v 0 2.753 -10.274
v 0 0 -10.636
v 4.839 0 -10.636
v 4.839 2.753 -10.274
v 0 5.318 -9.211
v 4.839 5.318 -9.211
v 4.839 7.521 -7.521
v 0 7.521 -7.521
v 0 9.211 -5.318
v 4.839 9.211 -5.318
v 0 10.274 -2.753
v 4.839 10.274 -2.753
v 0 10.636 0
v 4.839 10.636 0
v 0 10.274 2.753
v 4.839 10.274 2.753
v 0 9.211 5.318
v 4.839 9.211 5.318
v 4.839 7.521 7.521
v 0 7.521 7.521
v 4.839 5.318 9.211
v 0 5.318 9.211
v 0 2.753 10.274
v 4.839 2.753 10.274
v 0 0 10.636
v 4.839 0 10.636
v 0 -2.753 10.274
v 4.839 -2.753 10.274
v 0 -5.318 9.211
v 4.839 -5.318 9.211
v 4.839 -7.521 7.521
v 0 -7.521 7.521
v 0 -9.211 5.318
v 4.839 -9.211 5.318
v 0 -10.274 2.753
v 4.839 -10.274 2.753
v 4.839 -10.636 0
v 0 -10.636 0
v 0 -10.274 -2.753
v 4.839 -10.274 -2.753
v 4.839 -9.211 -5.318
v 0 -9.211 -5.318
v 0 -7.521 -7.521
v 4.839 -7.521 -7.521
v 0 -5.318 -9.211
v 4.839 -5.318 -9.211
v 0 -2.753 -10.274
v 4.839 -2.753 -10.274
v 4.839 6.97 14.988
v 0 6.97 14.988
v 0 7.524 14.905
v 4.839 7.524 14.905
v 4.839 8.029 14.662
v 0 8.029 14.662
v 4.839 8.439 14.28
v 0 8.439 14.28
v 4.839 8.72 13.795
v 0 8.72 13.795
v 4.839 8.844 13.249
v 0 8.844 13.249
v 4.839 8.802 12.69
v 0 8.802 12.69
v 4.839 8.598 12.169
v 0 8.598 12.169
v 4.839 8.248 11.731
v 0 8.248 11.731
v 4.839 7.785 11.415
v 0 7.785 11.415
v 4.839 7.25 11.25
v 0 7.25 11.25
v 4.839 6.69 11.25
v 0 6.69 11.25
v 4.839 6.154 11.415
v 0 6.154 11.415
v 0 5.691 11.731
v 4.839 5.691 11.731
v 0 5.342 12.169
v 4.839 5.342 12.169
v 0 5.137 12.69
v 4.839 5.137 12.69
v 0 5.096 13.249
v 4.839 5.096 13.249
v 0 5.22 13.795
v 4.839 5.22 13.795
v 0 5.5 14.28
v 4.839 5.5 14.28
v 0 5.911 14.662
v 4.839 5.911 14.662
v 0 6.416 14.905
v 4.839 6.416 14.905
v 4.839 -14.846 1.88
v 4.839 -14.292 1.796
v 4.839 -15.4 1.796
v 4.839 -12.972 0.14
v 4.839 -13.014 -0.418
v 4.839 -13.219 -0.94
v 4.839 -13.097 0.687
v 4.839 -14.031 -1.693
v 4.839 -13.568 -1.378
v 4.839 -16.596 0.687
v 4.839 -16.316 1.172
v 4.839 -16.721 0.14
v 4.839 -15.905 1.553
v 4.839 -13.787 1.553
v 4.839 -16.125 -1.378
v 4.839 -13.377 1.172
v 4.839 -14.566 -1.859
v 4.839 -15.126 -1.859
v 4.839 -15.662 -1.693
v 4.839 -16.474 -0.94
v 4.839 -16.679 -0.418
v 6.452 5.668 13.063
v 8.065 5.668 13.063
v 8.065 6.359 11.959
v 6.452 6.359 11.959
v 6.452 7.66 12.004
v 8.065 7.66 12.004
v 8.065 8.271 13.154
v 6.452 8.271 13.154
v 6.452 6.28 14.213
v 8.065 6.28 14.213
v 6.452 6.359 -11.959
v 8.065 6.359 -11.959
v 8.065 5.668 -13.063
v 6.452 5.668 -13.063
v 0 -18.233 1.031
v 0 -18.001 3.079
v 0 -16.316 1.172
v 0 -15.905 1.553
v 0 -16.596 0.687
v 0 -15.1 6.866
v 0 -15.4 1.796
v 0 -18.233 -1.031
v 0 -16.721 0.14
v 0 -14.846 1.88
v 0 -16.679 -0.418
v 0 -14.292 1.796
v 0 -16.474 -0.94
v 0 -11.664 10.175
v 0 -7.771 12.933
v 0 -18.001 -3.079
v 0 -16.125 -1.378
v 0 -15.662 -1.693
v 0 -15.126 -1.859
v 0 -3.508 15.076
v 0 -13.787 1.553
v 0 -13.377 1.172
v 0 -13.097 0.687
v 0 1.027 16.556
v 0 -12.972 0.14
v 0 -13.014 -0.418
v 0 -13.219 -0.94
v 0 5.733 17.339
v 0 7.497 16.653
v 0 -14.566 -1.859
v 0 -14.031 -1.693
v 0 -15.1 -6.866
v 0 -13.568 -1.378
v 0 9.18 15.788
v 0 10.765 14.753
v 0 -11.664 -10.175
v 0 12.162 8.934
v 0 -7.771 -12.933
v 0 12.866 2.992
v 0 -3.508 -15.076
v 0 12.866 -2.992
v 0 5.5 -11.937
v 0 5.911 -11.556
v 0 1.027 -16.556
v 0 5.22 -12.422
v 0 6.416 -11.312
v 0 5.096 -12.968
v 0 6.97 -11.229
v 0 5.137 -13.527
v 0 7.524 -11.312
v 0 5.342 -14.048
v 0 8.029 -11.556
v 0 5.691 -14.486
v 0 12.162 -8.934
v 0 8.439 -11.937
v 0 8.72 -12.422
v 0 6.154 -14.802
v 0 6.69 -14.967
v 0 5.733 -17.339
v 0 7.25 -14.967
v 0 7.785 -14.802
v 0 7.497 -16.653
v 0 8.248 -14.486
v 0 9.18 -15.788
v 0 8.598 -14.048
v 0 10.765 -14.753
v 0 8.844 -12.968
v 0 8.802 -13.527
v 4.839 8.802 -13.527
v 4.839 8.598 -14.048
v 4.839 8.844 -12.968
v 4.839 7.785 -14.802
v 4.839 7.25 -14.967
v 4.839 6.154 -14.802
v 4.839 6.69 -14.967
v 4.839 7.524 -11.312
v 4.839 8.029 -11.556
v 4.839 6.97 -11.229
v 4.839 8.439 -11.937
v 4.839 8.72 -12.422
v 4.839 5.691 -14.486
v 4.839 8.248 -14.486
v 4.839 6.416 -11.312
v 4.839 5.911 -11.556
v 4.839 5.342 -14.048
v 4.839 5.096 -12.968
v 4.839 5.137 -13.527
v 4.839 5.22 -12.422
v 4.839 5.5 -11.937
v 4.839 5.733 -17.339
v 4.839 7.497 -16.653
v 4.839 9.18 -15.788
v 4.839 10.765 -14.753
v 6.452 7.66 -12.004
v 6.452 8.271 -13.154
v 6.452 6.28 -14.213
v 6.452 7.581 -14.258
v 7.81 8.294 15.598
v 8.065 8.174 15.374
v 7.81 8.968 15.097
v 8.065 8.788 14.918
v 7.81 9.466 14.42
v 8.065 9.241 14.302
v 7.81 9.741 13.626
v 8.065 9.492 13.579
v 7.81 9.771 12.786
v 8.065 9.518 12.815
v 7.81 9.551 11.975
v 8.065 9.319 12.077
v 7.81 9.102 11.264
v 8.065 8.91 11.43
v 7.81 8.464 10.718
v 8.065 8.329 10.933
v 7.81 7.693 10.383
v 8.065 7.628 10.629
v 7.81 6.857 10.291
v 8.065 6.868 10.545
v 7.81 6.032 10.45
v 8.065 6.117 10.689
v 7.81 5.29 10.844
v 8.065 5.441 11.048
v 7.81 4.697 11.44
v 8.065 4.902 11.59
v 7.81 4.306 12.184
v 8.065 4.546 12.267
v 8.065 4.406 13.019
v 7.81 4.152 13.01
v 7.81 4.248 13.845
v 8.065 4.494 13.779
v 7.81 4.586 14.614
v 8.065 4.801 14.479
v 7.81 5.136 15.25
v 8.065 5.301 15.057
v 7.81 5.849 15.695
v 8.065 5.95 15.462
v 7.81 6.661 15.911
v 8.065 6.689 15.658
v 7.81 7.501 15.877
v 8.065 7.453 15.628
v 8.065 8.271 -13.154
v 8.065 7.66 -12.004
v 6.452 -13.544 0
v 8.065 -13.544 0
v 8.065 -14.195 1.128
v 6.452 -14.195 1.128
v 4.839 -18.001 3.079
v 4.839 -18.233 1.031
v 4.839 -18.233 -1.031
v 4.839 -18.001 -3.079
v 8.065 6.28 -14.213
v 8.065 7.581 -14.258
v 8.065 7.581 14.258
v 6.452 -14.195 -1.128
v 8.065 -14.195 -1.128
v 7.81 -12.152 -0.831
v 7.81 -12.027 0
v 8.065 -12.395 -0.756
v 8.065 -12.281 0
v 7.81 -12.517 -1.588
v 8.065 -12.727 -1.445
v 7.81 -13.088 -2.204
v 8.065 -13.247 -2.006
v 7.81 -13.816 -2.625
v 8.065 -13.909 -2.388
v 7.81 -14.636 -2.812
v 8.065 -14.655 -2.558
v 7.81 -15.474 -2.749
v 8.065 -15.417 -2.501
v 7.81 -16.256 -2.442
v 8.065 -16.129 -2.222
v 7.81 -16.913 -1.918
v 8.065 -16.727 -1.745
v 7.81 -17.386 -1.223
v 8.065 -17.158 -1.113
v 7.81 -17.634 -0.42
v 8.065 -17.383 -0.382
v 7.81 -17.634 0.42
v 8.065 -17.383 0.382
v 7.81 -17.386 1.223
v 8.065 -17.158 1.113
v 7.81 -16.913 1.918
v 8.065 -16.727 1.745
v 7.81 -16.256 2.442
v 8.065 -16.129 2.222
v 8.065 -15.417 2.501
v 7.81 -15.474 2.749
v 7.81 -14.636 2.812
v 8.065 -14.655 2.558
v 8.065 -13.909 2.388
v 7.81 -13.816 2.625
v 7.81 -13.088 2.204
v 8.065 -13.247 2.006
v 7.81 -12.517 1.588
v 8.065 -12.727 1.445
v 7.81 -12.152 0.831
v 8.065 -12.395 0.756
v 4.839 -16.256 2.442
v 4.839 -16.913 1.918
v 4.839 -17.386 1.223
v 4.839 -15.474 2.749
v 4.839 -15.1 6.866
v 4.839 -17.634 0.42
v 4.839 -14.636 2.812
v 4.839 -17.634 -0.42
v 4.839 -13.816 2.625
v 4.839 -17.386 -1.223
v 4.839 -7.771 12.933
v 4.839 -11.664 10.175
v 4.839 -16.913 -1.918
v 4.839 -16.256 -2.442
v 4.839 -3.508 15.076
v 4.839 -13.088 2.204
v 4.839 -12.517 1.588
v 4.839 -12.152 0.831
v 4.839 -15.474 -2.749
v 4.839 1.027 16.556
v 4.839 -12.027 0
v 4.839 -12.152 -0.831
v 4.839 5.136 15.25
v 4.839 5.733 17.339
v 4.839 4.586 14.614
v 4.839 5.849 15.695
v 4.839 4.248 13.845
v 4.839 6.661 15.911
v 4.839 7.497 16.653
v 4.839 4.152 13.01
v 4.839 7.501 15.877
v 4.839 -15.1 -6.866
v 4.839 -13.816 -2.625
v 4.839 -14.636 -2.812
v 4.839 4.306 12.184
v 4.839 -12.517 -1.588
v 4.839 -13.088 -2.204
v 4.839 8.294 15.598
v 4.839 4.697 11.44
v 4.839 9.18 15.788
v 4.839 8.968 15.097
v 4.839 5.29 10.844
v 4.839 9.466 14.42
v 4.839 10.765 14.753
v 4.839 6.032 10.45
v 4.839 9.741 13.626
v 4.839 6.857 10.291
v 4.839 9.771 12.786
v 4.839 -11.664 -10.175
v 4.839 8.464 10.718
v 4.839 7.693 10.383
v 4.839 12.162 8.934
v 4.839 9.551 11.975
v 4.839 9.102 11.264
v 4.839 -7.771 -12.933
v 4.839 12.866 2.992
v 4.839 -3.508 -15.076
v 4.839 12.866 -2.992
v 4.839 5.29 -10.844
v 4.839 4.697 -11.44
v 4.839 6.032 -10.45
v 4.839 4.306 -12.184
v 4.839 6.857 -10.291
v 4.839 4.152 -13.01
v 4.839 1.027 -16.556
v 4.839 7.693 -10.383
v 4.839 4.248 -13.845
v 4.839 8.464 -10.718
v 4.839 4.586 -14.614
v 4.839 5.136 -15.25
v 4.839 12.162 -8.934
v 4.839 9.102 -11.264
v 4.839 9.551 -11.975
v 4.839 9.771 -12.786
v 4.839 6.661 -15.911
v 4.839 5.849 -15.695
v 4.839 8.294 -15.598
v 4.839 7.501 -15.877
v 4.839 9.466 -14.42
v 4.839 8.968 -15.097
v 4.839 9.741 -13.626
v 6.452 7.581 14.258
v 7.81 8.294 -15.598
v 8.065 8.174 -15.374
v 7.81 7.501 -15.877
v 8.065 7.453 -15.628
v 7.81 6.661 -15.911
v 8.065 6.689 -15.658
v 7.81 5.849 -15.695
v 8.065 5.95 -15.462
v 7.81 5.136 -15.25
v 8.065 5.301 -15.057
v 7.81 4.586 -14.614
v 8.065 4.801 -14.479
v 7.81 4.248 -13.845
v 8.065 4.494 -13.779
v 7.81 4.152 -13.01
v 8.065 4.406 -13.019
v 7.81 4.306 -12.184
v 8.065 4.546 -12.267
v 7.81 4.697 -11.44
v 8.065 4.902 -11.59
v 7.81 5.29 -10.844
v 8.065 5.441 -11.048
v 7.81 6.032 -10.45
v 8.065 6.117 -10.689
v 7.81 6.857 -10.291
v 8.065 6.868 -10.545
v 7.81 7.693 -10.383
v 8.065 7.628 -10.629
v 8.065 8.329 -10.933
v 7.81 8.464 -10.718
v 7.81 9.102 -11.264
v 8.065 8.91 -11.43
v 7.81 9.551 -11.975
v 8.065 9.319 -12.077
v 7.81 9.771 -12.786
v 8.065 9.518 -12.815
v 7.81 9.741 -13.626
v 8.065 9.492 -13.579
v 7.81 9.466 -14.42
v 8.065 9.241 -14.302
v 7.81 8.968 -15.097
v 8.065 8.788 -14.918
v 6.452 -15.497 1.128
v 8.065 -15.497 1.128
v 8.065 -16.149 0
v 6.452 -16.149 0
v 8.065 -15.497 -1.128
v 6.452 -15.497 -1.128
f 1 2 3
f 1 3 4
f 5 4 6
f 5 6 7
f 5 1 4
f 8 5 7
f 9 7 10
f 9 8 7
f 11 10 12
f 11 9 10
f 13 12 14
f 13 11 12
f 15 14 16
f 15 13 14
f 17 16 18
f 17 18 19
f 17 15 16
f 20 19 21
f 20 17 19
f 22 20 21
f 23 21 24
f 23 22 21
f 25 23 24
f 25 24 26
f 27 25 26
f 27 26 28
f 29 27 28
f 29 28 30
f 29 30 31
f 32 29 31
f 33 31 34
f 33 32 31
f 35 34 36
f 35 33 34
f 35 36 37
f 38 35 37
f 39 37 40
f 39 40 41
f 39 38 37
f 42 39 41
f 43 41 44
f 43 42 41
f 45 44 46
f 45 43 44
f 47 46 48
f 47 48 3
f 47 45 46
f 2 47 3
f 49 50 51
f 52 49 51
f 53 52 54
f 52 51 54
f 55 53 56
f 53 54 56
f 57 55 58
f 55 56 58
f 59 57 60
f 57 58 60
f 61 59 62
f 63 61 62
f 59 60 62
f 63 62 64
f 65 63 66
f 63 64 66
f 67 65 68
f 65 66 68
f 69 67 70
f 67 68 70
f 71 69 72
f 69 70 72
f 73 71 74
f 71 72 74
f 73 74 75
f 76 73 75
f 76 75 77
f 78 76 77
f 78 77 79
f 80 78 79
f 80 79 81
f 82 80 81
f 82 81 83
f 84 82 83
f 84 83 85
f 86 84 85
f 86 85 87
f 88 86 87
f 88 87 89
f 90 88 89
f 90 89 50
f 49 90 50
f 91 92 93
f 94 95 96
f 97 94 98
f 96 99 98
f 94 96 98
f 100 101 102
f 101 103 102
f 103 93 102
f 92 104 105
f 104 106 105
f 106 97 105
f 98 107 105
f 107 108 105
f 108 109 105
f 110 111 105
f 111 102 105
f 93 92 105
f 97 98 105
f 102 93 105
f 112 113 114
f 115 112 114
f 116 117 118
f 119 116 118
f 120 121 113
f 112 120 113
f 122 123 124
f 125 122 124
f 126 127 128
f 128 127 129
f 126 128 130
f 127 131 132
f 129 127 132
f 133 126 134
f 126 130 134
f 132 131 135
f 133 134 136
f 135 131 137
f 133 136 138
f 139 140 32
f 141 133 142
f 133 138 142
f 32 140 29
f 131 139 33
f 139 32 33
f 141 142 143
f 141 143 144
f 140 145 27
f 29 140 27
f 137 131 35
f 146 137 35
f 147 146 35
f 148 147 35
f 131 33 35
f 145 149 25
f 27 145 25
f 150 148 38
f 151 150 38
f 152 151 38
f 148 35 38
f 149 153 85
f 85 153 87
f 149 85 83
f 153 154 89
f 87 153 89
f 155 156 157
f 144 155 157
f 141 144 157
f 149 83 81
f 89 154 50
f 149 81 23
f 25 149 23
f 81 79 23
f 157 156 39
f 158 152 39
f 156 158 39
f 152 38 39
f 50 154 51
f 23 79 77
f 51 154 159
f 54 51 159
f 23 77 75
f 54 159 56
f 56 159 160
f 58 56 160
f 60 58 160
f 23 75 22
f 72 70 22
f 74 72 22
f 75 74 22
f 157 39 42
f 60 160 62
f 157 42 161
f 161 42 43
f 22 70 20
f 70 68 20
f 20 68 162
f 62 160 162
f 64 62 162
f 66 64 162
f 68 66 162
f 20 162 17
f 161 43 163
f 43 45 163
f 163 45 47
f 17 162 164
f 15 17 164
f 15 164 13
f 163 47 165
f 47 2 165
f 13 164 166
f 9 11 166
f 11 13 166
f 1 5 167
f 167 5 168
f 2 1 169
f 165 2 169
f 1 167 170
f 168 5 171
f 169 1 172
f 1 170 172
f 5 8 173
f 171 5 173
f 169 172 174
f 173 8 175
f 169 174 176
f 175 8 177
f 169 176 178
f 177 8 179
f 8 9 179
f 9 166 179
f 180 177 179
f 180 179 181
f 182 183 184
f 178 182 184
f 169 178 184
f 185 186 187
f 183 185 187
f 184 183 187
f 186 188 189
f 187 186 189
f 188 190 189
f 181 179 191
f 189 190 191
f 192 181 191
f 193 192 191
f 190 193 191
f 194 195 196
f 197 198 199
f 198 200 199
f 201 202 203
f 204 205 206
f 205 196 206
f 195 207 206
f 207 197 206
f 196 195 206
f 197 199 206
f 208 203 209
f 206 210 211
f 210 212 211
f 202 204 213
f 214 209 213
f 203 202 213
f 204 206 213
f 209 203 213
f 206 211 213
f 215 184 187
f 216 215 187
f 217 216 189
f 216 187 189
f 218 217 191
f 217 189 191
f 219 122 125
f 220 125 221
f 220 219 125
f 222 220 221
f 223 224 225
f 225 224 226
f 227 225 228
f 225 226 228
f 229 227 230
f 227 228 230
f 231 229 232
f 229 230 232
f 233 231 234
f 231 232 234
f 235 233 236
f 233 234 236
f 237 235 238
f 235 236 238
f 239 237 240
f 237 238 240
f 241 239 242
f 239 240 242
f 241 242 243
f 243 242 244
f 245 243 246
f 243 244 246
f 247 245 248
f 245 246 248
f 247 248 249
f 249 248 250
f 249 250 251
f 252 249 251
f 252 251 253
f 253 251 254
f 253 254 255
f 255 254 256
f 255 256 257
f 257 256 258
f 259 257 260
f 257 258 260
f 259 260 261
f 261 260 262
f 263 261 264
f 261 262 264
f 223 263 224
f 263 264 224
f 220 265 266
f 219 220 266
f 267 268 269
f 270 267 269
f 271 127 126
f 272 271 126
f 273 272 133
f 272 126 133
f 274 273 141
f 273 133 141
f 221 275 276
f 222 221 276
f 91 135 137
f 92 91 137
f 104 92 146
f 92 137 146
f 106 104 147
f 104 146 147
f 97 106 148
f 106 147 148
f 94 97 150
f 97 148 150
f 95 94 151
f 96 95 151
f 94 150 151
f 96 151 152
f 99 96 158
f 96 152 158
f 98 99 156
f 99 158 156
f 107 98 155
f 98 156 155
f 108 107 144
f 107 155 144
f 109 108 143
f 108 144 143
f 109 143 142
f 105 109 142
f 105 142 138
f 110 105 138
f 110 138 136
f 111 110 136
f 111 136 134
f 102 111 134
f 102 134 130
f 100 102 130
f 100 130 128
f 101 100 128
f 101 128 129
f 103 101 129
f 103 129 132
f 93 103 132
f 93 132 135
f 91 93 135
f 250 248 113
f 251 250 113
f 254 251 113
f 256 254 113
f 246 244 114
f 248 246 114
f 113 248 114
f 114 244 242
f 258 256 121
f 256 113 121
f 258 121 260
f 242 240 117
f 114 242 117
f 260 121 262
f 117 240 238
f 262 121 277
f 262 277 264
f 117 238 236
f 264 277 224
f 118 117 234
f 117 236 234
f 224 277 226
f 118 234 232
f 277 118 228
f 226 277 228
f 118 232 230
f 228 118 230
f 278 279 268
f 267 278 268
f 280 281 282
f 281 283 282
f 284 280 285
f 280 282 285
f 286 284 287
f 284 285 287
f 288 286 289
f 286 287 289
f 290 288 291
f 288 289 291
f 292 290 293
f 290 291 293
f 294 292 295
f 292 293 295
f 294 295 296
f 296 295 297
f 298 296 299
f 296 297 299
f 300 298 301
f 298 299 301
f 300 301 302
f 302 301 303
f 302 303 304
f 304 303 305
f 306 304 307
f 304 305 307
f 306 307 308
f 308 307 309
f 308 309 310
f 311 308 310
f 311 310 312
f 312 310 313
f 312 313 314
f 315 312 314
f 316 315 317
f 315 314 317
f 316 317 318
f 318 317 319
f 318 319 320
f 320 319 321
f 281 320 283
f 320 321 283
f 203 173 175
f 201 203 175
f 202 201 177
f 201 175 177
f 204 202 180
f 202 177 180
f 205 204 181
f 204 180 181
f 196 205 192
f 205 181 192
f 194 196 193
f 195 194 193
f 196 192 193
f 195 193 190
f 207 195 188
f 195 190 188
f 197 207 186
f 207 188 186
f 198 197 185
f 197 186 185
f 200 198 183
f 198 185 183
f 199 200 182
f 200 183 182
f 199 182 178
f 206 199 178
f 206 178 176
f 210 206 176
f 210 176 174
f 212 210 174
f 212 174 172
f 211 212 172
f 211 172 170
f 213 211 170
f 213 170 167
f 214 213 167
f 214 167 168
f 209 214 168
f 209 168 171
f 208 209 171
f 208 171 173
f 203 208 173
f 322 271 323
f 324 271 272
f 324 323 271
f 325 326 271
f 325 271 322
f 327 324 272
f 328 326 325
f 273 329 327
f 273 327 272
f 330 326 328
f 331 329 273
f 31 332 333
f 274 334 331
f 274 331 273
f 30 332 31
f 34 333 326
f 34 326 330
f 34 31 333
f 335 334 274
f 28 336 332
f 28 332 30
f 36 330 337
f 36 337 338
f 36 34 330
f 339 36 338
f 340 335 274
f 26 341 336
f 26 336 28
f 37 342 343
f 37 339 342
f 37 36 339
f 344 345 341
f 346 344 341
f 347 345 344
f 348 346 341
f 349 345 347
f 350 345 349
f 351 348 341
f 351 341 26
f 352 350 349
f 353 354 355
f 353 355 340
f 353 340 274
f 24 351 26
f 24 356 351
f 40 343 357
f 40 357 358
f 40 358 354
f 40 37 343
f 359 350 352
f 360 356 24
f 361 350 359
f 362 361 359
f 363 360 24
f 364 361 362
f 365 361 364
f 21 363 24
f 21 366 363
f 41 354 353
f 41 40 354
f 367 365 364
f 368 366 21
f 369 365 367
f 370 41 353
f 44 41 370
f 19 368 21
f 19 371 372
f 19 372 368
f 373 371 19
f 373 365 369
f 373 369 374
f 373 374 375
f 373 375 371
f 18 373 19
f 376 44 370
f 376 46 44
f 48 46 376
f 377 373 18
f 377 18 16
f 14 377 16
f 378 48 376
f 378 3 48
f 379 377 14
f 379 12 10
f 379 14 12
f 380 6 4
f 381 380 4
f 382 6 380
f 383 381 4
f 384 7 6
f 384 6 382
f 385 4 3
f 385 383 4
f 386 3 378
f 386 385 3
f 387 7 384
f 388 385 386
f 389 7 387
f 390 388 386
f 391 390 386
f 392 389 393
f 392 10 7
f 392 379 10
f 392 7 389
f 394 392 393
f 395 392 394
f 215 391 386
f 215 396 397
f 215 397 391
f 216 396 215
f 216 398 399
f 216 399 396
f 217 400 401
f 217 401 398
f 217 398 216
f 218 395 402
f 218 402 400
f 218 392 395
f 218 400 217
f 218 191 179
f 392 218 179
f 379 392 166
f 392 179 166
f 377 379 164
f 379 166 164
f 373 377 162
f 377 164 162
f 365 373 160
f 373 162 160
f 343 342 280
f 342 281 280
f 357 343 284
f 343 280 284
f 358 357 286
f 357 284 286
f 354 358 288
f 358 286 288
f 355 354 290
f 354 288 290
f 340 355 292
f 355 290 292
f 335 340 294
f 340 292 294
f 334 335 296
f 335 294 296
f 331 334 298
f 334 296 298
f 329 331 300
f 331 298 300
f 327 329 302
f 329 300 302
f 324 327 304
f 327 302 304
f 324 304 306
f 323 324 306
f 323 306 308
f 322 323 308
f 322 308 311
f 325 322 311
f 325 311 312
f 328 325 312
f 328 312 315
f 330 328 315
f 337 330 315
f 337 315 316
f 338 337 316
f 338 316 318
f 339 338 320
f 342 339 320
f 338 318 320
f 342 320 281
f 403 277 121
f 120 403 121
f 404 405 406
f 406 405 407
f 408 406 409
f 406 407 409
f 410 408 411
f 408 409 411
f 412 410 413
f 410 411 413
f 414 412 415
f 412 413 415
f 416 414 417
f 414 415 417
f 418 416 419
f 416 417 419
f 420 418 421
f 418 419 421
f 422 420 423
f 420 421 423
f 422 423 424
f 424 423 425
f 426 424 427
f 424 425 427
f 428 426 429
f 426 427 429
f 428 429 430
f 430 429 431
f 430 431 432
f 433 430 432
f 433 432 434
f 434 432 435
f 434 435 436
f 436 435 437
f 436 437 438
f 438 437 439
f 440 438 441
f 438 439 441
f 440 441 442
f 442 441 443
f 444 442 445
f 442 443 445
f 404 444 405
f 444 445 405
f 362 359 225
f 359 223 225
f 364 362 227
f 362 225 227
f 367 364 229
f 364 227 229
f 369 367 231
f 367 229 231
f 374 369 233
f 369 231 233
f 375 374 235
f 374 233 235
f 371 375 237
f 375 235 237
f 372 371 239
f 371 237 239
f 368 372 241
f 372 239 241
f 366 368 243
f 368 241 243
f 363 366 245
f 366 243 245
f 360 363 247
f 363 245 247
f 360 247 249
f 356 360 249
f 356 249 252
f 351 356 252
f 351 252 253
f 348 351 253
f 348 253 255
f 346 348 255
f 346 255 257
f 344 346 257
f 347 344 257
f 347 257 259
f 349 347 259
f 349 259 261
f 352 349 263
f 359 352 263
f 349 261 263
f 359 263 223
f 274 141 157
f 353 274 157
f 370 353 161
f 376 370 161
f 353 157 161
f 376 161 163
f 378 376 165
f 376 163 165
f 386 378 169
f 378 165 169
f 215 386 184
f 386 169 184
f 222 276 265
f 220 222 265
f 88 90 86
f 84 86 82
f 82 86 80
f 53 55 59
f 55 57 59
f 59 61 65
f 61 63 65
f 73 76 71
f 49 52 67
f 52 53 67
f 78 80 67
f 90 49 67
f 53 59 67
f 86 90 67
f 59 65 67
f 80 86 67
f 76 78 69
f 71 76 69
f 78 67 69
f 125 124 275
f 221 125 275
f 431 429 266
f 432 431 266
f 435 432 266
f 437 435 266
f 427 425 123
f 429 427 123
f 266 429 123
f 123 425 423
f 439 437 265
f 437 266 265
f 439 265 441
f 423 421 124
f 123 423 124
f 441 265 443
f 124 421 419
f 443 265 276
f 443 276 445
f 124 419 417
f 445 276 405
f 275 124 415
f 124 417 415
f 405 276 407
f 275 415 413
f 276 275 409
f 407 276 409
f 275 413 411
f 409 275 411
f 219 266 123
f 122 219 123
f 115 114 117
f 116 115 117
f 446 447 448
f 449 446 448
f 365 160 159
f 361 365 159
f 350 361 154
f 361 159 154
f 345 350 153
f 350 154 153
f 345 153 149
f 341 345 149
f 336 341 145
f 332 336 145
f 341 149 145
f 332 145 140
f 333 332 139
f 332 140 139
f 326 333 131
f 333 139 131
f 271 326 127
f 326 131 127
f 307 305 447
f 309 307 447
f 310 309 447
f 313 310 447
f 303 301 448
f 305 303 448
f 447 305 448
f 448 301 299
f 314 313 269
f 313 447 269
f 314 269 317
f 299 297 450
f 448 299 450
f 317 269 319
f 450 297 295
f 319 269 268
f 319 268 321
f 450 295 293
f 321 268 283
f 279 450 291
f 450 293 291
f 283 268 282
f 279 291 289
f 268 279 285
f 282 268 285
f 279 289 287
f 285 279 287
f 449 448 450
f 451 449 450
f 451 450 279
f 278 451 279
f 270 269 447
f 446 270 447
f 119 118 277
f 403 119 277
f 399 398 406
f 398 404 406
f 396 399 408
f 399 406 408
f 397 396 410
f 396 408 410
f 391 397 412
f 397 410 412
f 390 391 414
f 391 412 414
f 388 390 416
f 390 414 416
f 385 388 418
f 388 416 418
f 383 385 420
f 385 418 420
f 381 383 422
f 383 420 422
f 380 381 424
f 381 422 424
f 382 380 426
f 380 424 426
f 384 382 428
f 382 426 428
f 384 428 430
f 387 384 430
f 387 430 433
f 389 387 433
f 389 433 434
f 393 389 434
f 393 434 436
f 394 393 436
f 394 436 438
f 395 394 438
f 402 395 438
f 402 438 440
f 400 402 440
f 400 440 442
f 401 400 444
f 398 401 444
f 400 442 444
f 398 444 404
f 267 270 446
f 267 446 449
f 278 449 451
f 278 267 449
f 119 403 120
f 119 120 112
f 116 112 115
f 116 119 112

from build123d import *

# Parameters (mm, degrees)
SKETCH1_R           = 10.63625
BOSS_EXTRUDE1_DEPTH = 4.8387
HOLE1_D             = 3.7592
HOLE2_D             = 3.7592
HOLE3_D             = 3.7592
CUT_EXTRUDE1_DEPTH  = 1.6129
CUT_EXTRUDE2_DEPTH  = 1.6129
CUT_EXTRUDE3_DEPTH  = 1.6129


with BuildPart() as part:
    # Sketch1 → Boss-Extrude1 (new body)
    with BuildSketch(Plane(origin=(0, 0, 0), x_dir=(0, 0, -1), z_dir=(1, 0, 0))):
        with BuildLine():
            ThreePointArc((-17.339461313, 5.732856195), (-12.932597366, -7.770688459), (-3.078572423, -18.001248584))
            ThreePointArc((-3.078572423, -18.001248584), (0, -18.2626), (3.078572423, -18.001248584))
            ThreePointArc((3.078572423, -18.001248584), (12.932597366, -7.770688459), (17.339461313, 5.732856195))
            ThreePointArc((17.339461313, 5.732856195), (16.242165379, 8.349528284), (14.752793477, 10.764647852))
            ThreePointArc((14.752793477, 10.764647852), (0, 12.954), (-14.752793477, 10.764647852))
            ThreePointArc((-14.752793477, 10.764647852), (-16.242165379, 8.349528284), (-17.339461313, 5.732856195))
        make_face()
        Circle(SKETCH1_R, mode=Mode.SUBTRACT)
    extrude(amount=BOSS_EXTRUDE1_DEPTH)

    # Hole1 (through all)
    with Locations(Plane(origin=(4.8387, 0, 0), x_dir=(0, 0, -1), z_dir=(1, 0, 0))):
        with Locations((-13.108504848, 6.969915663)):
            Hole(HOLE1_D / 2)

    # Sketch4 → Revolve1 (revolve)
    with BuildSketch(Plane(origin=(0, 0, 0), x_dir=(-1, 0, 0), z_dir=(0, -0.882947592858928, 0.469471562785889))):
        Polygon((-4.8387, -14.8463), (-4.8387, -17.6657), (-7.8105, -17.6657), (-8.0645, -17.4117), (-8.0645, -14.8463), align=None)
    revolve(axis=Axis((8.0645, 6.969915663, 13.108504848), (-1, 0, 0)))

    # Hole2 (through all)
    with Locations(Plane(origin=(4.8387, 0, 0), x_dir=(0, 0, -1), z_dir=(1, 0, 0))):
        with Locations((13.108504848, 6.969915663)):
            Hole(HOLE2_D / 2)

    # Sketch7 → Revolve2 (revolve)
    with BuildSketch(Plane(origin=(0, 0, 0), x_dir=(1, 0, 0), z_dir=(0, 0.882947592858928, 0.469471562785889))):
        Polygon((4.8387, 14.8463), (4.8387, 17.6657), (7.8105, 17.6657), (8.0645, 17.4117), (8.0645, 14.8463), align=None)
    revolve(axis=Axis((8.0645, 6.969915663, -13.108504848), (-1, 0, 0)))

    # Hole3 (through all)
    with Locations(Plane(origin=(4.8387, 0, 0), x_dir=(0, 0, -1), z_dir=(1, 0, 0))):
        with Locations((0, -14.8463)):
            Hole(HOLE3_D / 2)

    # Sketch10 → Revolve3 (revolve)
    with BuildSketch(Plane.XY):
        Polygon((4.8387, -14.8463), (4.8387, -12.0269), (7.8105, -12.0269), (8.0645, -12.2809), (8.0645, -14.8463), align=None)
    revolve(axis=Axis((8.0645, -14.8463, 0), (-1, 0, 0)))

    # Sketch11 → Cut-Extrude1 (cut)
    with BuildSketch(Plane(origin=(8.0645, 0, 0), x_dir=(0, 0, -1), z_dir=(1, 0, 0))):
        Polygon((-1.12776, -14.19518746), (-1.12776, -15.49741254), (0, -16.148525079), (1.12776, -15.49741254), (1.12776, -14.19518746), (0, -13.544074921), align=None)
    extrude(amount=-CUT_EXTRUDE1_DEPTH, mode=Mode.SUBTRACT)

    # Sketch12 → Cut-Extrude2 (cut)
    with BuildSketch(Plane(origin=(8.0645, 0, 0), x_dir=(0, 0, -1), z_dir=(1, 0, 0))):
        Polygon((11.958708349, 6.35855802), (13.063057848, 5.668483864), (14.212854347, 6.279841507), (14.258301347, 7.581273306), (13.153951848, 8.271347461), (12.004155349, 7.659989818), align=None)
    extrude(amount=-CUT_EXTRUDE2_DEPTH, mode=Mode.SUBTRACT)

    # Sketch13 → Cut-Extrude3 (cut)
    with BuildSketch(Plane(origin=(8.0645, 0, 0), x_dir=(0, 0, -1), z_dir=(1, 0, 0))):
        Polygon((-14.258301347, 7.581273306), (-14.212854347, 6.279841507), (-13.063057848, 5.668483864), (-11.958708349, 6.35855802), (-12.004155349, 7.659989818), (-13.153951848, 8.271347461), align=None)
    extrude(amount=-CUT_EXTRUDE3_DEPTH, mode=Mode.SUBTRACT)


solid = part.part
